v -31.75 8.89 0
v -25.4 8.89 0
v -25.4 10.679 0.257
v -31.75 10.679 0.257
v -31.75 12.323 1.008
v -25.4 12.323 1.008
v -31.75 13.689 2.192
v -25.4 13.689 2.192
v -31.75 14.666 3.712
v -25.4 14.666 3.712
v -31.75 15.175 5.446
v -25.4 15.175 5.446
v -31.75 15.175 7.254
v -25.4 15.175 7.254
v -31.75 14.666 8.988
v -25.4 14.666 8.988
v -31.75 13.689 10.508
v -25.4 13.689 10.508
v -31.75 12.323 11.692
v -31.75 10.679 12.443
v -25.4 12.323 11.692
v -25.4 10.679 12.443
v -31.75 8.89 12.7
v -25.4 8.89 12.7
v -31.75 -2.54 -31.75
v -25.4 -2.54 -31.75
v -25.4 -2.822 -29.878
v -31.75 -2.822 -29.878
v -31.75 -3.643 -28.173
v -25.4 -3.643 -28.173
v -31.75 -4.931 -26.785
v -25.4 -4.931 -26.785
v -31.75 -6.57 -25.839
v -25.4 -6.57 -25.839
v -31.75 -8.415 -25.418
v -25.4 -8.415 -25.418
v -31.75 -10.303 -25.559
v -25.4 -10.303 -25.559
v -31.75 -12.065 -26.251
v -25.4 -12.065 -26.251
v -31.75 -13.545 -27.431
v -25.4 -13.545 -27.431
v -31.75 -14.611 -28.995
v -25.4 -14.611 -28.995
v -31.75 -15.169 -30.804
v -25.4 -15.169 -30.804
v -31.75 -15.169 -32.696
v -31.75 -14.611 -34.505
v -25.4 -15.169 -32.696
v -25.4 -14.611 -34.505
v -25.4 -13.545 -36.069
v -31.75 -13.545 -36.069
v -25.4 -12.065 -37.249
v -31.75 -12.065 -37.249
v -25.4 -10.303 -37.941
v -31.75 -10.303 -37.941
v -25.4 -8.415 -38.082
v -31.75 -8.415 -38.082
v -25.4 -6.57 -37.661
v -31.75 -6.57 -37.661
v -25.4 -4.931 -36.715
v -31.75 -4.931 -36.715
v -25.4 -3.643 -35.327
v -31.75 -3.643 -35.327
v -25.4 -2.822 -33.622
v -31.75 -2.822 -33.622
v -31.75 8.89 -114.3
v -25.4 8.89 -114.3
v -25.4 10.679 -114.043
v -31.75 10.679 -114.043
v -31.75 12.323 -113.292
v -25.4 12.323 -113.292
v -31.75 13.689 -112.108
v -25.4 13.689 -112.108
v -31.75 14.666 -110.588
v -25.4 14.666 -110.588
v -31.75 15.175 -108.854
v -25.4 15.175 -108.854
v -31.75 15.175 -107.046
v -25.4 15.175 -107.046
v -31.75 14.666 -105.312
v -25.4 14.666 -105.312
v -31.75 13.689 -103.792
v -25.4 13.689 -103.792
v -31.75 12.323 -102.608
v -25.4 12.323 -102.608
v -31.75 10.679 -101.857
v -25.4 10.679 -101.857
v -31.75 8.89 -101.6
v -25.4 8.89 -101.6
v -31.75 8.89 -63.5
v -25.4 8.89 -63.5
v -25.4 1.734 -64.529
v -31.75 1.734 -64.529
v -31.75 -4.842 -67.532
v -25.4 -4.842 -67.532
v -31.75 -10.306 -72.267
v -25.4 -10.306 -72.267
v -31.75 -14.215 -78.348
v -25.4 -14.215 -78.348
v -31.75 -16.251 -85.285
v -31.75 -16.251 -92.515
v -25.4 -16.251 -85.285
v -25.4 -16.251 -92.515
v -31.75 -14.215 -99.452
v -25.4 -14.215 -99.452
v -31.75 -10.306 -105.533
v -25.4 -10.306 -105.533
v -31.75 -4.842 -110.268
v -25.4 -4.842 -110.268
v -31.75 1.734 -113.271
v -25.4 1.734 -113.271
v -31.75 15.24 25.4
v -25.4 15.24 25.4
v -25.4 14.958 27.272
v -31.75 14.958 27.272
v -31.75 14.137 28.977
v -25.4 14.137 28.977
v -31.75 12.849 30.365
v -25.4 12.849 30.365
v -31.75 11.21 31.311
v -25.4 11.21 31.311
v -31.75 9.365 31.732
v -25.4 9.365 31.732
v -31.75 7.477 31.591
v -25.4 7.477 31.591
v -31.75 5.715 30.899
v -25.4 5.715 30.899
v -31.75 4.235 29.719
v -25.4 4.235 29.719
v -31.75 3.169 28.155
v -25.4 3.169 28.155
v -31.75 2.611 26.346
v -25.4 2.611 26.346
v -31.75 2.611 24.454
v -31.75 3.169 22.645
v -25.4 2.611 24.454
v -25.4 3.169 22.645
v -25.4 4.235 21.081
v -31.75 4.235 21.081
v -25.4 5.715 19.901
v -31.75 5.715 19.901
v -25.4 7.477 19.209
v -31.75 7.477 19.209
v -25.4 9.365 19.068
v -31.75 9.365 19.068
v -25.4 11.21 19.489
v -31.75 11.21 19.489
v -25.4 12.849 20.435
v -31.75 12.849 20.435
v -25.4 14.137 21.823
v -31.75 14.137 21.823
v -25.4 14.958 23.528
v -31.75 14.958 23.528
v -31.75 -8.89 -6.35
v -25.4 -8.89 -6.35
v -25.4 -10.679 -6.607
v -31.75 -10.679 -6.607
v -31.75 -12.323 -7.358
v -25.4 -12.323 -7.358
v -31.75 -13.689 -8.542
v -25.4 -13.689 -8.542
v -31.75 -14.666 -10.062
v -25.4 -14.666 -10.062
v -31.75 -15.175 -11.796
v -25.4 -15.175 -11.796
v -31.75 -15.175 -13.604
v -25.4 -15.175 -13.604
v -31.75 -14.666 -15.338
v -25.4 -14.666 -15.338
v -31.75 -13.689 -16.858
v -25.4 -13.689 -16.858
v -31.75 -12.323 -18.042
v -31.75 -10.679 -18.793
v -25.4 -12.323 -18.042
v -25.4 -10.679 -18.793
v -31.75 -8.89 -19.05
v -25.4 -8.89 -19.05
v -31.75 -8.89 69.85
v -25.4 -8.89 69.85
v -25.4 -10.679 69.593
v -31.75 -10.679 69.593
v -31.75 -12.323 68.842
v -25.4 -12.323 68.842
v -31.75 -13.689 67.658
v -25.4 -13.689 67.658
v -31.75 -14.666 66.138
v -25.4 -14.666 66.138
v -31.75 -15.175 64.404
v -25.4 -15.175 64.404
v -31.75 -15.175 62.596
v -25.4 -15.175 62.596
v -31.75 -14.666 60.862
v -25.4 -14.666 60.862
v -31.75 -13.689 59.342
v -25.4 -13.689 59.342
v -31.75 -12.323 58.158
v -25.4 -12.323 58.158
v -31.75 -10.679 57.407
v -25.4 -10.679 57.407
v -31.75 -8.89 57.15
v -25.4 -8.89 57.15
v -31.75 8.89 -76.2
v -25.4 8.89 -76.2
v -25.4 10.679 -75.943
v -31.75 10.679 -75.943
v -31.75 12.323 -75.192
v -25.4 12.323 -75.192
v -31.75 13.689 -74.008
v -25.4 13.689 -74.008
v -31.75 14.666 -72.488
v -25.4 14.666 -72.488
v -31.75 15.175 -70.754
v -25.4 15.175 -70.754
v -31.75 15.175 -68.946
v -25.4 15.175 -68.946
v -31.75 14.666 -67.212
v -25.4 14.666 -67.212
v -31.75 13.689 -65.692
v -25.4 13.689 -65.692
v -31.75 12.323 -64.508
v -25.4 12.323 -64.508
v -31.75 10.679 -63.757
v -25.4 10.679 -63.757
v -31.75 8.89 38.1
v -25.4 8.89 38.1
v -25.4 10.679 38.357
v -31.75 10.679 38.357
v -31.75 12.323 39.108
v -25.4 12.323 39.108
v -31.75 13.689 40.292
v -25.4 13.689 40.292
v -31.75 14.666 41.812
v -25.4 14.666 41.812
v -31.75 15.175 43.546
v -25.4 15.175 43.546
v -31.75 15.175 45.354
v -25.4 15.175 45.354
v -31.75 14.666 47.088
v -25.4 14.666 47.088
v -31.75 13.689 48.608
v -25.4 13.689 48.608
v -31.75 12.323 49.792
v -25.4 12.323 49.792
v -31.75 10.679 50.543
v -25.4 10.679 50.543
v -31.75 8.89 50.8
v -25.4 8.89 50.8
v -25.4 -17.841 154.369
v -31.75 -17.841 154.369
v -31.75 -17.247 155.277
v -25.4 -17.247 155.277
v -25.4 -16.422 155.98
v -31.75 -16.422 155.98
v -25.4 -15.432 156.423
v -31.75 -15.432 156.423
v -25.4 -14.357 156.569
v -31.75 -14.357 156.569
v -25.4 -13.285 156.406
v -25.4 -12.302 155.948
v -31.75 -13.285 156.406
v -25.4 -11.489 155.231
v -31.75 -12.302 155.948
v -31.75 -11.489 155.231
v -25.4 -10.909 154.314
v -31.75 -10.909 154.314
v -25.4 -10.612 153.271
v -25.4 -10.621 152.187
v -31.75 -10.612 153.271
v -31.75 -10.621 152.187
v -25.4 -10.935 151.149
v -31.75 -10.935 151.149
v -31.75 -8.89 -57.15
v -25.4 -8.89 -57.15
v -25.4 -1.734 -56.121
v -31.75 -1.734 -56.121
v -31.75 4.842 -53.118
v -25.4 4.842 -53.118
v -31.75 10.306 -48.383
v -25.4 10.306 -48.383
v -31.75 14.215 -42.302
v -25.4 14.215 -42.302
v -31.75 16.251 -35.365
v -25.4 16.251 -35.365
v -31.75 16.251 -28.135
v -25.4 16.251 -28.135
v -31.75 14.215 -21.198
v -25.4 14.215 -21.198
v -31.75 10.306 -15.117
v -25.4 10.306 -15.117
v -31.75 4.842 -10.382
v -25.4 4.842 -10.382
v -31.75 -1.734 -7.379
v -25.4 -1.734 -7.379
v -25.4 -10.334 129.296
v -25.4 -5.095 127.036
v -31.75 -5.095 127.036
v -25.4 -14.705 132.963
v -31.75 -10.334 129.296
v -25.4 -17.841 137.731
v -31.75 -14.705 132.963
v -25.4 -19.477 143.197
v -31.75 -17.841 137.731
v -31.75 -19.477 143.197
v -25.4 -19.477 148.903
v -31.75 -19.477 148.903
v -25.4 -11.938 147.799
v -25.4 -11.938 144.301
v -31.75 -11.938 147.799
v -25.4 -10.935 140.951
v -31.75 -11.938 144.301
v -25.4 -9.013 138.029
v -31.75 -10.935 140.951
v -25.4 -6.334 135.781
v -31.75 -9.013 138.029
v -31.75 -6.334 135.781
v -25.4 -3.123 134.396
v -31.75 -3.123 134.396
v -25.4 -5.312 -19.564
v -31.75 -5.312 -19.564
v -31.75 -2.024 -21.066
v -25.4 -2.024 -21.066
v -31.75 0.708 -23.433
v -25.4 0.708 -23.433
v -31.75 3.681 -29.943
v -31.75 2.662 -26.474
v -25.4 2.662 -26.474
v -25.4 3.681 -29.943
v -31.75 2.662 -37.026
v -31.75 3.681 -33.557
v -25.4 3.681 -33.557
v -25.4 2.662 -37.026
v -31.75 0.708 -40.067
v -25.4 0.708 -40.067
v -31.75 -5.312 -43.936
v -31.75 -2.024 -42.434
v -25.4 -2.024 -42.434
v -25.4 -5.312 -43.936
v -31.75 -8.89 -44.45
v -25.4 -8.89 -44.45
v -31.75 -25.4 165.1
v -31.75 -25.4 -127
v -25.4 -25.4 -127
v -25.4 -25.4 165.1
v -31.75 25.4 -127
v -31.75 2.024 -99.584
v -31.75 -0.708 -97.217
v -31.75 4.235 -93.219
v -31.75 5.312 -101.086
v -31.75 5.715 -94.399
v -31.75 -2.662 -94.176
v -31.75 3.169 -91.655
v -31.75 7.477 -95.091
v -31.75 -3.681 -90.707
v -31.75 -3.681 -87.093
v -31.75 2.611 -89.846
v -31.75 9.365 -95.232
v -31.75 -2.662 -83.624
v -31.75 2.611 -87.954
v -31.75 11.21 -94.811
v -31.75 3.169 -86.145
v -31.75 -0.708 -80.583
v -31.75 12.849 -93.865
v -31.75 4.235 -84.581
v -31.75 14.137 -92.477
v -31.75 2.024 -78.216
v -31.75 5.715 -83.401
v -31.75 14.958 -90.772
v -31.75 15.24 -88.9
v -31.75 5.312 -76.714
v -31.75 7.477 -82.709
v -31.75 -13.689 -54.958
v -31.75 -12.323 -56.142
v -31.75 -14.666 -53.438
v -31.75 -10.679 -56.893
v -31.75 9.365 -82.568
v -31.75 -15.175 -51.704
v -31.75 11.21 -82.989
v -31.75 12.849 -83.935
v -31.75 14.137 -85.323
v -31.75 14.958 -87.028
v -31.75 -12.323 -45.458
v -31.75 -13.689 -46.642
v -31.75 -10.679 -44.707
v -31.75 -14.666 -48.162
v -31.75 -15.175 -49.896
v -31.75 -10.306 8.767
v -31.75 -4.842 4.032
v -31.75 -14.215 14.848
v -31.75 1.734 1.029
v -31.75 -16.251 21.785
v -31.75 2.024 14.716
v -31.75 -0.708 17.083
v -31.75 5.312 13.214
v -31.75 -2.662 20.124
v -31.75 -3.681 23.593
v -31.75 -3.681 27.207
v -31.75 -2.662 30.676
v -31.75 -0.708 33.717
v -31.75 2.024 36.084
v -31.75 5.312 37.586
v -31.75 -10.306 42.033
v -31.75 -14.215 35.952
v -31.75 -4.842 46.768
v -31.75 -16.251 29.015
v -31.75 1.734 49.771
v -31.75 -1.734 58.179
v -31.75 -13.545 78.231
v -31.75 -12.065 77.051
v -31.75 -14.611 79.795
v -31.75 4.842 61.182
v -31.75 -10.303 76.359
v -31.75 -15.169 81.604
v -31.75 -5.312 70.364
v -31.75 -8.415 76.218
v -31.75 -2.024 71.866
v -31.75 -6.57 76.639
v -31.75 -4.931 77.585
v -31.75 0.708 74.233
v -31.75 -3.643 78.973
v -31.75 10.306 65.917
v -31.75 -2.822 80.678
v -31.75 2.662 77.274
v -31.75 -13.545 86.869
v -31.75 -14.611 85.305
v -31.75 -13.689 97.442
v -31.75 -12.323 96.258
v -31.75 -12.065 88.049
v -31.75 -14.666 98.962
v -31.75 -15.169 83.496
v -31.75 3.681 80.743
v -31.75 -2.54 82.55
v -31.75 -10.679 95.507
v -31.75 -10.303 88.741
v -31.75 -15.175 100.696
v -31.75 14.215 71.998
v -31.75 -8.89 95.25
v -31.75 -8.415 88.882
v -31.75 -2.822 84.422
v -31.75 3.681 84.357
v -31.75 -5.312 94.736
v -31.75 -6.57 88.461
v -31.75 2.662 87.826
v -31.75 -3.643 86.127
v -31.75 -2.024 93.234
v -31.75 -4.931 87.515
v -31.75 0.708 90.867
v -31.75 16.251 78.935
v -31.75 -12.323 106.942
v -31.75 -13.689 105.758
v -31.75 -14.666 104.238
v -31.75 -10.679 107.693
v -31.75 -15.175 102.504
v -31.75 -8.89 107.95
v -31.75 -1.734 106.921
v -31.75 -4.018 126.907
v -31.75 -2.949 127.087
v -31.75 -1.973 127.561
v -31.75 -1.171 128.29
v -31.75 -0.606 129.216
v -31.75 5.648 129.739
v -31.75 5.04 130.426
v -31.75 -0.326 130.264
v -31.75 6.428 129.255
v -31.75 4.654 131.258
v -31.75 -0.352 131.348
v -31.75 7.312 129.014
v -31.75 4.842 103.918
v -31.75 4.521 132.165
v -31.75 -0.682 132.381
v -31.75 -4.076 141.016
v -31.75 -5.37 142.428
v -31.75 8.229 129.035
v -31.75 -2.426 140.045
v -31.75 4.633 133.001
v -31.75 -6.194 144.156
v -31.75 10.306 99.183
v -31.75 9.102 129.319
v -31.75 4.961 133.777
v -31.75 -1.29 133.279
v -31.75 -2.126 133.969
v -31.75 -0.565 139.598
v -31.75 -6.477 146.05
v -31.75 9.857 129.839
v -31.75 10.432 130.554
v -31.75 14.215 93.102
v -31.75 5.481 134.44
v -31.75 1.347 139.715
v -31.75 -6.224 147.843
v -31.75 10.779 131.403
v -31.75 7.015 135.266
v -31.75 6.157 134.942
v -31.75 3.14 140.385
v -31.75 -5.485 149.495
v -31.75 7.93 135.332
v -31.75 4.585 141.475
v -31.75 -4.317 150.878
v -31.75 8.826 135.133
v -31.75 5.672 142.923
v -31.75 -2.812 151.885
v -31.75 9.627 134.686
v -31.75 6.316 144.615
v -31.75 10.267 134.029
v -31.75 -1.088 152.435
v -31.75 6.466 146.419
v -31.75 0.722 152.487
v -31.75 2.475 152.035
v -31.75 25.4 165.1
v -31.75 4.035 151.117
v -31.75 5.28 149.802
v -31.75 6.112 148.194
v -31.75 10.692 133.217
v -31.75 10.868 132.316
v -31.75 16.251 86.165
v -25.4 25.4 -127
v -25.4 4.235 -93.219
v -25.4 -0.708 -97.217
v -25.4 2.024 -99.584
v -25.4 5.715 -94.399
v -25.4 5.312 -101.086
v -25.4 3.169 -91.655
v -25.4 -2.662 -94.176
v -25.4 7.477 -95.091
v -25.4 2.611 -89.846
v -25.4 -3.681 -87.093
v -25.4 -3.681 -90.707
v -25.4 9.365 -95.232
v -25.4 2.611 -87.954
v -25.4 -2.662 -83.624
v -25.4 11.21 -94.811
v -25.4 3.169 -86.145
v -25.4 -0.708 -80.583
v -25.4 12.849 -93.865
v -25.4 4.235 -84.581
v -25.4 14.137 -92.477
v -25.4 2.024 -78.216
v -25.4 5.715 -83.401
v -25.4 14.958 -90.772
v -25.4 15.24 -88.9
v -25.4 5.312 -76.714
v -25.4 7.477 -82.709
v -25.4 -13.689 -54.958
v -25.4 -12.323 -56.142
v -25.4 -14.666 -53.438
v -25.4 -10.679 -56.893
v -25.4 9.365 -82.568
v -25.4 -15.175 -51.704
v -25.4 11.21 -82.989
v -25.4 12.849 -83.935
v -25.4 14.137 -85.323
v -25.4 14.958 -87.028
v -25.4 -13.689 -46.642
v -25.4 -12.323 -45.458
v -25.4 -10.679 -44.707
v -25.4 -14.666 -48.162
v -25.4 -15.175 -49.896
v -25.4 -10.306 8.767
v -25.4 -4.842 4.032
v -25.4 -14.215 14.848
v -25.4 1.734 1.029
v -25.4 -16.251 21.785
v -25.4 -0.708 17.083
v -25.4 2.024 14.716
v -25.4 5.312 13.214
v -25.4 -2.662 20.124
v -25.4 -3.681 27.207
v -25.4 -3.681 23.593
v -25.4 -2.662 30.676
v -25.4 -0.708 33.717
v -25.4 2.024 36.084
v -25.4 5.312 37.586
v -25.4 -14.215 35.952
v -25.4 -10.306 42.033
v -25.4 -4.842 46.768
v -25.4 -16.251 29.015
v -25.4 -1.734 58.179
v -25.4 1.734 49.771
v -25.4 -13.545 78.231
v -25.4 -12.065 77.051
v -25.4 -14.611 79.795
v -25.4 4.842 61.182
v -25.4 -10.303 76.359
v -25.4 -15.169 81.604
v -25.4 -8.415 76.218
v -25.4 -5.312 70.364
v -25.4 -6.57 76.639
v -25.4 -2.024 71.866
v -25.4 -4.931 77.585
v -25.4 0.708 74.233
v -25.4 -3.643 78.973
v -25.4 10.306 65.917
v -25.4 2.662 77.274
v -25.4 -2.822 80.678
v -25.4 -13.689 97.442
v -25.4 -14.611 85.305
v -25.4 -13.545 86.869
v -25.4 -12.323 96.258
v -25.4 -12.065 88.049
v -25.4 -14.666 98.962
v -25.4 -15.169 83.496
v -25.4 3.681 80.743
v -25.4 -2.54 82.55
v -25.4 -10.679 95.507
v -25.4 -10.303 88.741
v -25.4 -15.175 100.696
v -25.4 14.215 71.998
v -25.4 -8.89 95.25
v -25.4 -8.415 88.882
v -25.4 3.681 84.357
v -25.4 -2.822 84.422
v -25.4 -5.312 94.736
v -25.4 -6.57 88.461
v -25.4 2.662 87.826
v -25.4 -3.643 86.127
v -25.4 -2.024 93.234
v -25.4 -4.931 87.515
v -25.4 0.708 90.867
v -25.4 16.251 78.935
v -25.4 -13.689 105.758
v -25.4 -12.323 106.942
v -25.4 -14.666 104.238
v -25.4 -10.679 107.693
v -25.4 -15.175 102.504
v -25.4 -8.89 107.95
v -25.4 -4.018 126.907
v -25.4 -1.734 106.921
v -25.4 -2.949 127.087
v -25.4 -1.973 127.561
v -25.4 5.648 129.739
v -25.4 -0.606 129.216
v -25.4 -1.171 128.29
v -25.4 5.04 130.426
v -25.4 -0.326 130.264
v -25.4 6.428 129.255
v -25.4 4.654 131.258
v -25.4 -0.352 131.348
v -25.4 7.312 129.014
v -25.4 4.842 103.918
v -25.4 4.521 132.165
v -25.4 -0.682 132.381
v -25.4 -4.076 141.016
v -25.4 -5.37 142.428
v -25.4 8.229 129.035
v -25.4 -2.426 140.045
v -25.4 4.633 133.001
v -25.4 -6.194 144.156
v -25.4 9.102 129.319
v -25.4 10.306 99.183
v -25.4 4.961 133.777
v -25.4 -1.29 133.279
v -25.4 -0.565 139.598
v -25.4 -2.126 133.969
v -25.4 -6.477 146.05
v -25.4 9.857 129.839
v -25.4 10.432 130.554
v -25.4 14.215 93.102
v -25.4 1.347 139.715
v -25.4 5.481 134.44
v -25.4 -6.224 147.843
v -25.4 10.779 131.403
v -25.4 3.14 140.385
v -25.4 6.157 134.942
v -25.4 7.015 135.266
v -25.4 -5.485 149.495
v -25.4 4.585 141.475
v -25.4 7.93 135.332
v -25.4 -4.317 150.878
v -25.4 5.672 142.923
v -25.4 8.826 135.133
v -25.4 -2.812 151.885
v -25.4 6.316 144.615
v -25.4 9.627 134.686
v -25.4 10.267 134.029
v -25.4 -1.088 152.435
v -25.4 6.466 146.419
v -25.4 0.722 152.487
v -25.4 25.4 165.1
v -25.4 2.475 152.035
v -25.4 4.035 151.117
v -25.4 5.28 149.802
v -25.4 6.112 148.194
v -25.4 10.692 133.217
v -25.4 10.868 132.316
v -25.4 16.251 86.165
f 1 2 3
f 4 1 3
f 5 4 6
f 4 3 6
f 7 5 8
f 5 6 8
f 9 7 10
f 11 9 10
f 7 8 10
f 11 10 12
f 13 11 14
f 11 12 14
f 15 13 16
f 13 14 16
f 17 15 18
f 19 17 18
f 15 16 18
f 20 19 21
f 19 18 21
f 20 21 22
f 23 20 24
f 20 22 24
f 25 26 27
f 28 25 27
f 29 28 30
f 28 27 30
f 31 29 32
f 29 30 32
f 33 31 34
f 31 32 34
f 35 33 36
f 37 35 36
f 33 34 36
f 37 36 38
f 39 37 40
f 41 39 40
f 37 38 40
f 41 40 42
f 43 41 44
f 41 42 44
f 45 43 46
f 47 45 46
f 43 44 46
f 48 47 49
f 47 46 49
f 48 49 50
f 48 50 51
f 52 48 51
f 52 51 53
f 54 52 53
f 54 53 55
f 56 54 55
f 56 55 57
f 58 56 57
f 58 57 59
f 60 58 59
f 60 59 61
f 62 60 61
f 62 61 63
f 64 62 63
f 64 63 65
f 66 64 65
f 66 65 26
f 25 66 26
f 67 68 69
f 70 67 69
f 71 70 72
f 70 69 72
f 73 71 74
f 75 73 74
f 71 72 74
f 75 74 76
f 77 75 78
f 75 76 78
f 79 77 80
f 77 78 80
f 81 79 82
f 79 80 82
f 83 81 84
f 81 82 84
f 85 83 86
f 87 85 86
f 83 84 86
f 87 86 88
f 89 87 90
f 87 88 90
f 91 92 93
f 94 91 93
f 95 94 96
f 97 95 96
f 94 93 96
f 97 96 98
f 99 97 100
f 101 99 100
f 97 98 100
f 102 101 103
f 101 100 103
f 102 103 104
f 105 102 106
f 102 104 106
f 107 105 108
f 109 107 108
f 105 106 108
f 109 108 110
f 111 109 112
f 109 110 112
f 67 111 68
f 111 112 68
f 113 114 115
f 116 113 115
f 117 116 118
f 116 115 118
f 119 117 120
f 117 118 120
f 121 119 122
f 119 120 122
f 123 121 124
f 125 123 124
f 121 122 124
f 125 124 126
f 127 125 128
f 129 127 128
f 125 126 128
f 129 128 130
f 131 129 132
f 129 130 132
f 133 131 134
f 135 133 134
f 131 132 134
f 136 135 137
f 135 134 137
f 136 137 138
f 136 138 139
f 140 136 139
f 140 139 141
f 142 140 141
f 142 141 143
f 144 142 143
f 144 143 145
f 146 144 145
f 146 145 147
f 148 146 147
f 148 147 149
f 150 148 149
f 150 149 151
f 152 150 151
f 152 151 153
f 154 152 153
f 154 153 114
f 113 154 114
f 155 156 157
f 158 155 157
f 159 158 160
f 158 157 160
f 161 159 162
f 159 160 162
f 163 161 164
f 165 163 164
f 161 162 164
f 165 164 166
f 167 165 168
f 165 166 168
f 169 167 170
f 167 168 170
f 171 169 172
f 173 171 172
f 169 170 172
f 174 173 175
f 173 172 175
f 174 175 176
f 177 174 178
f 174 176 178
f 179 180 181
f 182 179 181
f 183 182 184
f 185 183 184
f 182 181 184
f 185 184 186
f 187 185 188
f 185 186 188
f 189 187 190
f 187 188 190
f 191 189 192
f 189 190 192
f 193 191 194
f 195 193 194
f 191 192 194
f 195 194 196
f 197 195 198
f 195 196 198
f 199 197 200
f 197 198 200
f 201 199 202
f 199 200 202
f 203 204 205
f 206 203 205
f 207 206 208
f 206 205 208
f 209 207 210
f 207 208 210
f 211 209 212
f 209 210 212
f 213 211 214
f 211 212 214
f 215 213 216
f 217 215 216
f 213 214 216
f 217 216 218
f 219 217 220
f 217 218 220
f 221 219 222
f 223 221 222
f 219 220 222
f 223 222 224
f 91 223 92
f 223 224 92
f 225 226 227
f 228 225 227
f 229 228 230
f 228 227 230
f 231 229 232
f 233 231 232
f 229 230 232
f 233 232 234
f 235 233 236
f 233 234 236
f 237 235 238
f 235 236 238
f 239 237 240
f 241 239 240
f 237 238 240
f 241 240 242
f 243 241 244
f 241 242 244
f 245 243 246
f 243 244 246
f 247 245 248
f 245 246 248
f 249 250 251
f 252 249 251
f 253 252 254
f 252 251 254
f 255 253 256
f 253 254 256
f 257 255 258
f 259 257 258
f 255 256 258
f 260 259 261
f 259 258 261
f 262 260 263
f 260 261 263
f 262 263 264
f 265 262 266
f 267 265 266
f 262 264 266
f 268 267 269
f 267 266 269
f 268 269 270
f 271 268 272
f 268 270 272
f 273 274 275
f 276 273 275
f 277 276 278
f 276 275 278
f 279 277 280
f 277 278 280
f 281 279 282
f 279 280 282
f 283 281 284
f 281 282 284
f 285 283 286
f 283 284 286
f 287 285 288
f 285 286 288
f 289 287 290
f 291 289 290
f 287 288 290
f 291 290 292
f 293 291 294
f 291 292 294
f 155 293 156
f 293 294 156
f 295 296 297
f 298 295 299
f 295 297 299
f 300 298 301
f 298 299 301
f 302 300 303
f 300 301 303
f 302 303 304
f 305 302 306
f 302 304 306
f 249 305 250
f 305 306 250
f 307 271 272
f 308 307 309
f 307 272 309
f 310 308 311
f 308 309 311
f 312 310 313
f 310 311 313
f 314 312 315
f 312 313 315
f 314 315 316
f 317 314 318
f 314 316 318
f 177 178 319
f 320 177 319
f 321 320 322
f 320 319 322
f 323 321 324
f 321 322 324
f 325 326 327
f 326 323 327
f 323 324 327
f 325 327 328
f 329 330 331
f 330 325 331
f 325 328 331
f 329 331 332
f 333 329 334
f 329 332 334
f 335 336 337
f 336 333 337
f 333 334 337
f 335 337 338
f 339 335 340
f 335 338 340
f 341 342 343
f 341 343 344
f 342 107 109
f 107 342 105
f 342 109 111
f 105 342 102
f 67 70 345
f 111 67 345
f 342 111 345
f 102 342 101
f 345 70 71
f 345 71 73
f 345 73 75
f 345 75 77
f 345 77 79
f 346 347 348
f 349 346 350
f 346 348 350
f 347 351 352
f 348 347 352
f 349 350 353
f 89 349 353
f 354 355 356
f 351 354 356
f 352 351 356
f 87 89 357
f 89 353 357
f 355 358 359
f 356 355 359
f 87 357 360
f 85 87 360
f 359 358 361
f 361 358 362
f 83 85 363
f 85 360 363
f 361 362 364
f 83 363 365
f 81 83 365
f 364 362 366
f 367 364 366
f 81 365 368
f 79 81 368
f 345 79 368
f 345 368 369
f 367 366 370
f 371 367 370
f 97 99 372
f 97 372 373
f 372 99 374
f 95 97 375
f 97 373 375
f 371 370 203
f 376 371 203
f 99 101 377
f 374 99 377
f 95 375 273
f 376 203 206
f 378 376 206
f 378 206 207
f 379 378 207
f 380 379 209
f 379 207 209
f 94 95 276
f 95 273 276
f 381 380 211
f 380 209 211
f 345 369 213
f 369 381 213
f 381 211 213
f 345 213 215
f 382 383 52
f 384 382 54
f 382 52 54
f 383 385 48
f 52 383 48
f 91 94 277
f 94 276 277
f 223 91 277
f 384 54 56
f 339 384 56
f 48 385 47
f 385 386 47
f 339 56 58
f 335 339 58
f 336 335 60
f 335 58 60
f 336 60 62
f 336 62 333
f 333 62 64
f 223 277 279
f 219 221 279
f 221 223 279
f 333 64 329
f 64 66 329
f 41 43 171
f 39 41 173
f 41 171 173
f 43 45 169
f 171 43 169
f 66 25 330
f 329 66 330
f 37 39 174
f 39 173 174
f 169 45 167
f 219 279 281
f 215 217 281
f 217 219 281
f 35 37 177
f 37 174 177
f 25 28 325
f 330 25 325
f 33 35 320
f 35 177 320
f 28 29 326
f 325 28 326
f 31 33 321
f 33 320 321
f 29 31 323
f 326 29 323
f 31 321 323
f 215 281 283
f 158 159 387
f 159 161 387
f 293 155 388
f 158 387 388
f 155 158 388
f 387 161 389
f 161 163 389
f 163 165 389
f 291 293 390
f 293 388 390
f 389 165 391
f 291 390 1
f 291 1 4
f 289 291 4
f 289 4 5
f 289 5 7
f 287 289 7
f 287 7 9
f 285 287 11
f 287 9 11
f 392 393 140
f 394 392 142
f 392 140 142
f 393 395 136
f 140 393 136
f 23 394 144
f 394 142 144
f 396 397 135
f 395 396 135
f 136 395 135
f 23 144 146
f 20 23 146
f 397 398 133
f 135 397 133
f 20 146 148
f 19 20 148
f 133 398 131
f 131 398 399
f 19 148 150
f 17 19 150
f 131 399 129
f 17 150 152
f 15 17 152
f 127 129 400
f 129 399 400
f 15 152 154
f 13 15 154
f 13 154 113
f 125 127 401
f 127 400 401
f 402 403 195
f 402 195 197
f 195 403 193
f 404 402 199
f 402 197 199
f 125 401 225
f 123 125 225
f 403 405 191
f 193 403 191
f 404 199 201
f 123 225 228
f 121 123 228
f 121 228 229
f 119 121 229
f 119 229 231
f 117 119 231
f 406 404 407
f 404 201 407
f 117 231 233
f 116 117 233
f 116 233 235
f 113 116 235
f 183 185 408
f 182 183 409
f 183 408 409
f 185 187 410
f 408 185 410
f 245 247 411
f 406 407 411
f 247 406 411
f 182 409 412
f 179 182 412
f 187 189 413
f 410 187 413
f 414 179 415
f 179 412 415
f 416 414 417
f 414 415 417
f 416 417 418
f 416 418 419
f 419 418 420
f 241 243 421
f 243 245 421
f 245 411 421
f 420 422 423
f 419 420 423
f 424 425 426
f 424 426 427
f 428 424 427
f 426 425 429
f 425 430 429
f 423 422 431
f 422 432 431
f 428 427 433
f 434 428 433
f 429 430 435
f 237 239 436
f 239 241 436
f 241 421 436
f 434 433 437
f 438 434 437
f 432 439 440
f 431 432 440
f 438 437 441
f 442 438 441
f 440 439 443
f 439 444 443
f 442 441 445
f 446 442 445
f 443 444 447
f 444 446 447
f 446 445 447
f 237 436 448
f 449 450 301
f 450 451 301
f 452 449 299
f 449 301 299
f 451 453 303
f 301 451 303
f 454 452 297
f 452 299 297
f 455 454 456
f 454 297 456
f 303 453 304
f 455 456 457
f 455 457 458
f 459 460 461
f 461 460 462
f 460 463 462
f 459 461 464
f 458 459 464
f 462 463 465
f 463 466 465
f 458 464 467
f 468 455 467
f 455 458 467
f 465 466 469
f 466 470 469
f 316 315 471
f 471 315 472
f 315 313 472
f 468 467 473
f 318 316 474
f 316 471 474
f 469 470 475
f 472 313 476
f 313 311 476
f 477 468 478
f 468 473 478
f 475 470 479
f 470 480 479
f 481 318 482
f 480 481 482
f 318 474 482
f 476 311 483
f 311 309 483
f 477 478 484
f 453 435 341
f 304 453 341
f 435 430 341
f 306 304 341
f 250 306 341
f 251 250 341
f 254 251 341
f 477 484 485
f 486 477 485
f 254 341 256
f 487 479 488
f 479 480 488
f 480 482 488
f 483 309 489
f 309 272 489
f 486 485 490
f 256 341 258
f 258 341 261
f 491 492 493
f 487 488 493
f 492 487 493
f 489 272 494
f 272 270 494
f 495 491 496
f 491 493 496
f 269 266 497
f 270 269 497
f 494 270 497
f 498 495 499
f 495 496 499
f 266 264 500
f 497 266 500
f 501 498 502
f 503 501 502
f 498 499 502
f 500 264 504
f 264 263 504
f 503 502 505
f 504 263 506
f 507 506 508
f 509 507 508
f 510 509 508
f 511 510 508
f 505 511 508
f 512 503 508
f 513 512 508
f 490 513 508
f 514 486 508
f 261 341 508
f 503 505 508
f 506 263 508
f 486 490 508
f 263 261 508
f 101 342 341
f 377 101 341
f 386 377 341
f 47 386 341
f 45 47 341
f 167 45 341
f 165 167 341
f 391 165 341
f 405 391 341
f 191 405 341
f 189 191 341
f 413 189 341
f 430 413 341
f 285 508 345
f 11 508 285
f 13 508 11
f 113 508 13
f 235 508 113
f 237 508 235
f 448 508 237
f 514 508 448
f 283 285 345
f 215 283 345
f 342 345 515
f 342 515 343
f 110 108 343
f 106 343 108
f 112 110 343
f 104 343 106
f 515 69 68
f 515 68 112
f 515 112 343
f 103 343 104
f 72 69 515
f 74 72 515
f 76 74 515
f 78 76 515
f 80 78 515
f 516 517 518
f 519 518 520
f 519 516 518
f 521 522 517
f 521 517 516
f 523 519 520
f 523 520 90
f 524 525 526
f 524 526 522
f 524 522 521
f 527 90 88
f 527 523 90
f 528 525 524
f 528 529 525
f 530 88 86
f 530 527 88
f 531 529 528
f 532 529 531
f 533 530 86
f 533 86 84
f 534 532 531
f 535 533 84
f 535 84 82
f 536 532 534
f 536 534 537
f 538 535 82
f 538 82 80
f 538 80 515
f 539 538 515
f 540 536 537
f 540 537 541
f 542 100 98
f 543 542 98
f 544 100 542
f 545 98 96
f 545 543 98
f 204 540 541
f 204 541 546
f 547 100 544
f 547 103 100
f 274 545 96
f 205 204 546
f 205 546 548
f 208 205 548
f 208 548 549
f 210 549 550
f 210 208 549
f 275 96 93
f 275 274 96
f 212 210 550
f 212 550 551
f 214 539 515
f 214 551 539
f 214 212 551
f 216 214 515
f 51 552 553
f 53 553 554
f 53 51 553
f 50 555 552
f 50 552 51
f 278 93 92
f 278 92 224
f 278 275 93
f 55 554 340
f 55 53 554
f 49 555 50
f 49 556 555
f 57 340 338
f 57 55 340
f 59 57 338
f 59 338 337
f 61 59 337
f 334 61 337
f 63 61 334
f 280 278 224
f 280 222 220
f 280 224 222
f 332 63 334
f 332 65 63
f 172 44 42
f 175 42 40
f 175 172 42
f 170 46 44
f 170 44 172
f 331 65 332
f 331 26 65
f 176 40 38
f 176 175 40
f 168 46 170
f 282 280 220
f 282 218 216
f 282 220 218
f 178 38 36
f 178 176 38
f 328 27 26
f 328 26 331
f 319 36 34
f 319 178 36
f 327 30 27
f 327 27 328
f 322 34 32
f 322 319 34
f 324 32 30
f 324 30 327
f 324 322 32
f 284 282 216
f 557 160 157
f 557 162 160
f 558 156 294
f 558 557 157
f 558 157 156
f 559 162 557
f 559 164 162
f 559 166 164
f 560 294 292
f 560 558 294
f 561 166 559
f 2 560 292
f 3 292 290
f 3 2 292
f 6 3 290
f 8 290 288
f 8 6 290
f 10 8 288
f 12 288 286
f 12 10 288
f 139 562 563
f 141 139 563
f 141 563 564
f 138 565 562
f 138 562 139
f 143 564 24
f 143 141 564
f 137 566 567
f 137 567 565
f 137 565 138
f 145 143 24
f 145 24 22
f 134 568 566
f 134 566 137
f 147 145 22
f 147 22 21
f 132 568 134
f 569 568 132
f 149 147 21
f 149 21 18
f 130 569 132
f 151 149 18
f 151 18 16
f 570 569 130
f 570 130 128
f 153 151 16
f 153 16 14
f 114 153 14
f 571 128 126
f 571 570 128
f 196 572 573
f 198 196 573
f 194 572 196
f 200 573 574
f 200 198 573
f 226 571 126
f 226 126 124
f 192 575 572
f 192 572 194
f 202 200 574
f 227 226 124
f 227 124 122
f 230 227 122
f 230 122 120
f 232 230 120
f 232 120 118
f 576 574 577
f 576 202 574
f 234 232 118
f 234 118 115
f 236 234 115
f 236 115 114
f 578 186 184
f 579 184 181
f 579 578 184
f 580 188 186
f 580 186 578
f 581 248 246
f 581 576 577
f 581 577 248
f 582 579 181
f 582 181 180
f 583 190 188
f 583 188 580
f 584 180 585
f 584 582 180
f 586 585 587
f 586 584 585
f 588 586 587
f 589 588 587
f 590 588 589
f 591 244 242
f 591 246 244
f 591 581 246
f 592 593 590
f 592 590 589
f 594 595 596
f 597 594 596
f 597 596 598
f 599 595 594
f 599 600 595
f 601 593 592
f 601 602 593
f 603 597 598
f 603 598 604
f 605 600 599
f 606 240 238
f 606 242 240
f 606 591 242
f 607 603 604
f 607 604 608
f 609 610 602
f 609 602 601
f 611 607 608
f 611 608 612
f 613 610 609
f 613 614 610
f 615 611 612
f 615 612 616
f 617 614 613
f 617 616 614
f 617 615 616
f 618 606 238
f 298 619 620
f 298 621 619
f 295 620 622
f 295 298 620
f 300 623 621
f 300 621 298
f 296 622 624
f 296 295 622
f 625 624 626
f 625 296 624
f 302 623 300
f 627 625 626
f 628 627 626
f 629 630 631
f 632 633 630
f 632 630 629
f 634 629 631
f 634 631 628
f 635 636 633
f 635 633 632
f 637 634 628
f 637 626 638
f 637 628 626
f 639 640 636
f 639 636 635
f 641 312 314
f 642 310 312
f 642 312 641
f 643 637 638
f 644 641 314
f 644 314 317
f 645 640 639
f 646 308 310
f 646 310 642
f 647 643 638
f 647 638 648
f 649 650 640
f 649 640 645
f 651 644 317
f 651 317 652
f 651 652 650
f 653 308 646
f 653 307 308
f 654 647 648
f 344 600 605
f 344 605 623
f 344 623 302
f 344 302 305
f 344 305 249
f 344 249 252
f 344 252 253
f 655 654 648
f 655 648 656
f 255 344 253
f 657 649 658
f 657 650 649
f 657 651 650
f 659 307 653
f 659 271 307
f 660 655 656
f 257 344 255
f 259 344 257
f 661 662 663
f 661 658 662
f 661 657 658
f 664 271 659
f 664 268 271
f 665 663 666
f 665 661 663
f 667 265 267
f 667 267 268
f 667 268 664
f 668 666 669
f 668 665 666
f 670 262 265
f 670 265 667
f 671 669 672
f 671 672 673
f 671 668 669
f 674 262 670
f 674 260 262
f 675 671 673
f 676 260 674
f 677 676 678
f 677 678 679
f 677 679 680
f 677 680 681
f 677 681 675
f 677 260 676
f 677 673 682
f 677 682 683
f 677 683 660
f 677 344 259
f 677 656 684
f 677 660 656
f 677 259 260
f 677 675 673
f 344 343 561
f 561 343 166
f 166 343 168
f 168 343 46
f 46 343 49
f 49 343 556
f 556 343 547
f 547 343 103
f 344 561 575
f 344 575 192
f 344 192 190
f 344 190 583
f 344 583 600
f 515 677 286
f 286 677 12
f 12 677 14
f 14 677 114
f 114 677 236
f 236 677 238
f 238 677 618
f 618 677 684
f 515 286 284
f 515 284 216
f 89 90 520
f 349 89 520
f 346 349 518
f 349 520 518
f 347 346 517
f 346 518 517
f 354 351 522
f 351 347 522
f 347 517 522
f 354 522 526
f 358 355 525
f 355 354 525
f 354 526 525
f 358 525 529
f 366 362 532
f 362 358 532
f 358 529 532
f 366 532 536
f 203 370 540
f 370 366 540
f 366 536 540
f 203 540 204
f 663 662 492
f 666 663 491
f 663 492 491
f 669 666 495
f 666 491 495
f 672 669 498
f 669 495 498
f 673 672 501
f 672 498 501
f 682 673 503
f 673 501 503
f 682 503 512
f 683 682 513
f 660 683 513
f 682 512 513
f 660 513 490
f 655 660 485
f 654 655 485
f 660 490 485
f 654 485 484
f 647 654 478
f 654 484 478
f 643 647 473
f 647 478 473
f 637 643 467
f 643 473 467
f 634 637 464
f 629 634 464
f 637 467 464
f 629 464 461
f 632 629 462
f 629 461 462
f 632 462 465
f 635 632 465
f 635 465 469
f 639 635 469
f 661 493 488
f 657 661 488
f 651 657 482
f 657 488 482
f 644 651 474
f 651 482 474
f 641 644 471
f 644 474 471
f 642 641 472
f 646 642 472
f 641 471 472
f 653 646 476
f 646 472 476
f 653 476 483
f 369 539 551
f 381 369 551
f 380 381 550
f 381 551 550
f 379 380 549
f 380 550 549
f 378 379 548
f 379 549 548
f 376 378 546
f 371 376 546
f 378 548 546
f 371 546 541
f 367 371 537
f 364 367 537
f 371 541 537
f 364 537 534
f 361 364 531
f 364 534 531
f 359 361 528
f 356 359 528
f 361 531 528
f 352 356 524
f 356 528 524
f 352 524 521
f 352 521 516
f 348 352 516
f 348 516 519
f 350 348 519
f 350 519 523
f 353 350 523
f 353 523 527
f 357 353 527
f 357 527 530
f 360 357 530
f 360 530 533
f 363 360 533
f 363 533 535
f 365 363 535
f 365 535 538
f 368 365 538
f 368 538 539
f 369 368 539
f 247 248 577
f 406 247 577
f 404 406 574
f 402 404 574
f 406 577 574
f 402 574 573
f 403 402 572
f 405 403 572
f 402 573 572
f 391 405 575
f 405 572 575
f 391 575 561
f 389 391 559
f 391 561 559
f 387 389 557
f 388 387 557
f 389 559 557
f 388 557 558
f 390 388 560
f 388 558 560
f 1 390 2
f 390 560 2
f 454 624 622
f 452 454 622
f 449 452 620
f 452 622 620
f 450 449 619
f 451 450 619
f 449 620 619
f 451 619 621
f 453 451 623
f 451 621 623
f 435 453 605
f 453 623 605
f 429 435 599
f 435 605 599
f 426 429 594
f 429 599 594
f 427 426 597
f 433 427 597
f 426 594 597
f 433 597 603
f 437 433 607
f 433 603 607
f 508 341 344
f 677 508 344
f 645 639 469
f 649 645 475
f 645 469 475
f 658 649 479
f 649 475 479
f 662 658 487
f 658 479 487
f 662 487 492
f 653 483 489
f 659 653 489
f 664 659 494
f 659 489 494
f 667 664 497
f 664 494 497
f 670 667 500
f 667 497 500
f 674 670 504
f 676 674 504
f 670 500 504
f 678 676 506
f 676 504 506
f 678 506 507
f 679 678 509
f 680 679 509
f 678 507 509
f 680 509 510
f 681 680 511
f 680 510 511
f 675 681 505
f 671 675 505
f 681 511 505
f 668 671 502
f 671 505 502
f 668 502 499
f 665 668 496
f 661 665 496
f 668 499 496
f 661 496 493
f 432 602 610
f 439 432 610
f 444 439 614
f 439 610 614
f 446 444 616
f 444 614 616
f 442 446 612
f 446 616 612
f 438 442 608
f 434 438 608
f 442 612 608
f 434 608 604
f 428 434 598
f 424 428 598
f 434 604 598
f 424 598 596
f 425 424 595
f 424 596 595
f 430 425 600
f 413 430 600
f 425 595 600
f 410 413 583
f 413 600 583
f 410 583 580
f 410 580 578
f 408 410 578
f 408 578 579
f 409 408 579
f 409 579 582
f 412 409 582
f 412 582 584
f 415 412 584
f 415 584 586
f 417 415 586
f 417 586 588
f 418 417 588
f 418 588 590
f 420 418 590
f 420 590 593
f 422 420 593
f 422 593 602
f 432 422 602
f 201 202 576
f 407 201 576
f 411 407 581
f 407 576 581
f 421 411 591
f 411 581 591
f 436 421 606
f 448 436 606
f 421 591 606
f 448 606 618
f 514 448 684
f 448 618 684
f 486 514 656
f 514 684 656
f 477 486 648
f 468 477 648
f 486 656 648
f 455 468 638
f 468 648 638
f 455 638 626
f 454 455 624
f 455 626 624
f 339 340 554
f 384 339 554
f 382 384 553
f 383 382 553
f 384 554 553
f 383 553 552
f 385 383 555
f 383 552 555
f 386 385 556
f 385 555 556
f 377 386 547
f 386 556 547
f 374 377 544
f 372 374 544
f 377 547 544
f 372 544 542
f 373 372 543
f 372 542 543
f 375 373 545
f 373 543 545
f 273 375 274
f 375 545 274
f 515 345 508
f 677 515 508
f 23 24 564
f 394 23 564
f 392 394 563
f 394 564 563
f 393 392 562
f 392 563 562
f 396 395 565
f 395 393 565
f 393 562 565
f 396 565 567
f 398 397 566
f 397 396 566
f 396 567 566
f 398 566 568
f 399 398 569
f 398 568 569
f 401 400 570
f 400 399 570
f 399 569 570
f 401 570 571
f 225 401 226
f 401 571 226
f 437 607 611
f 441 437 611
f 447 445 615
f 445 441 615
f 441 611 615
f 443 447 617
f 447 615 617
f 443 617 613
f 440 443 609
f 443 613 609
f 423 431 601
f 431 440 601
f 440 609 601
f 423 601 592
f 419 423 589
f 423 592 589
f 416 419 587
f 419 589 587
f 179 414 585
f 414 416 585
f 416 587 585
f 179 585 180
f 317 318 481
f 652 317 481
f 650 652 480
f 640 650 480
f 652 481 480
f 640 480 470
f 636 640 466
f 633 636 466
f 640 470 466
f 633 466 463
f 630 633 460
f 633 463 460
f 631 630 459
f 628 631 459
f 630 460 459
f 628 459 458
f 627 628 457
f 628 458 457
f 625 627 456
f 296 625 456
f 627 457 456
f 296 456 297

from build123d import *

# Parameters (mm, degrees)
F0_W      = 63.5
F0_H      = 63.5
F0_W_2    = 50.8
F0_H_2    = 50.8
F1_DEPTH  = 165.1
F3_R      = 6.477
F4_DEPTH  = 25.4
F6_DEPTH  = 25.4
F7_R      = 6.35
F8_DEPTH  = 63.501
F9_W      = 145.7979530096
F9_H      = 377.9422044754
F9_W_2    = 50.8
F9_H_2    = 292.1
F10_DEPTH = 63.5
F11_W     = 97.6704657078
F11_H     = 338.8985395432
F12_DEPTH = 57.151


# Not quite as in the source:
# - ends of sketch curves that miss each other by under 0.0002 mm in the source are joined


with BuildPart() as f1:
    # F0 (on Top) → F1 (new body, symmetric)
    with BuildSketch(Plane.XY):
        Rectangle(F0_W, F0_H)
        Rectangle(F0_W_2, F0_H_2, mode=Mode.SUBTRACT)
    extrude(amount=F1_DEPTH, both=True)

    # F3 (on face) → F4 (cut)
    with BuildSketch(Plane.YZ.offset(31.75)):
        with Locations((0, 146.05)):
            Circle(F3_R)
        with BuildLine():
            ThreePointArc((10.1385245046, 129.1766616857), (14.6288058895, 132.8781640138), (17.8406687878, 137.7307595176))
            ThreePointArc((17.8406687878, 137.7307595176), (19.4934269332, 143.3103775076), (19.4426449846, 149.1294124443))
            ThreePointArc((19.4426449846, 149.1294124443), (15.0835370951, 152.2964897102), (11.9164598293, 147.9373818207))
            ThreePointArc((11.9164598293, 147.9373818207), (11.9475842494, 144.3708765369), (10.9346034506, 140.9511106721))
            ThreePointArc((10.9346034506, 140.9511106721), (8.9660423194, 137.9769392343), (6.2139343738, 135.708276517))
            ThreePointArc((6.2139343738, 135.708276517), (4.9104220235, 130.4801740359), (10.1385245046, 129.1766616857))
        make_face()
        with BuildLine():
            ThreePointArc((-10.1385245046, 129.1766616857), (-4.9104220235, 130.4801740359), (-6.2139343738, 135.708276517))
            ThreePointArc((-6.2139343738, 135.708276517), (-8.9660423194, 137.9769392343), (-10.9346034506, 140.9511106721))
            ThreePointArc((-10.9346034506, 140.9511106721), (-11.9475842494, 144.3708765369), (-11.9164598293, 147.9373818207))
            ThreePointArc((-11.9164598293, 147.9373818207), (-15.0835370951, 152.2964897102), (-19.4426449846, 149.1294124443))
            ThreePointArc((-19.4426449846, 149.1294124443), (-19.4934269332, 143.3103775076), (-17.8406687878, 137.7307595176))
            ThreePointArc((-17.8406687878, 137.7307595176), (-14.6288058895, 132.8781640138), (-10.1385245046, 129.1766616857))
        make_face()
    extrude(amount=-F4_DEPTH, mode=Mode.SUBTRACT)

    # F5 (on face) → F6 (cut)
    with BuildSketch(Plane(origin=(-31.75, 0, 0), x_dir=(0, -1, 0), z_dir=(-1, 0, 0))):
        with BuildLine():
            ThreePointArc((-3.1401119103, 140.3850881569), (3.2873259769, 140.4692279278), (6.477, 146.05))
            ThreePointArc((6.477, 146.05), (-3.2873259769, 151.6307720722), (-3.1401119103, 140.3850881569))
        make_face()
        with BuildLine():
            ThreePointArc((-4.5213527214, 132.1654121492), (-4.960680137, 133.7768464516), (-6.1570821771, 134.9423297193))
            ThreePointArc((-6.1570821771, 134.9423297193), (-10.4320253058, 130.5539778468), (-4.5213527214, 132.1654121492))
        make_face()
        with BuildLine():
            ThreePointArc((3.1226517792, 134.3961049058), (0.4285749428, 129.7298269458), (5.0948529028, 127.0357501095))
            ThreePointArc((5.0948529028, 127.0357501095), (17.8406687878, 137.7307595176), (17.8406687878, 154.3692404824))
            ThreePointArc((17.8406687878, 154.3692404824), (12.777460542, 156.2120975737), (10.9346034506, 151.1488893279))
            ThreePointArc((10.9346034506, 151.1488893279), (10.9346034506, 140.9511106721), (3.1226517792, 134.3961049058))
        make_face()
    extrude(amount=-F6_DEPTH, mode=Mode.SUBTRACT)

    # F7 (on face) → F8 (cut, through all)
    with BuildSketch(Plane.YZ.offset(31.75)):
        with BuildLine():
            ThreePointArc((-8.89, 107.949999693), (-15.239999693, 101.6), (-8.89, 95.250000307))
            ThreePointArc((-8.89, 95.250000307), (3.81, 82.55), (-8.89, 69.85))
            ThreePointArc((-8.89, 69.85), (-15.239999693, 63.5), (-8.89, 57.150000307))
            ThreePointArc((-8.89, 57.150000307), (16.509999693, 82.55), (-8.89, 107.949999693))
        make_face()
        with BuildLine():
            ThreePointArc((8.89, 3.07e-07), (15.239999693, 6.35), (8.89, 12.699999693))
            ThreePointArc((8.89, 12.699999693), (-3.81, 25.4), (8.89, 38.1))
            ThreePointArc((8.89, 38.1), (15.24, 44.45), (8.89, 50.8))
            ThreePointArc((8.89, 50.8), (-16.509999693, 25.4), (8.89, 3.07e-07))
        make_face()
        with BuildLine():
            ThreePointArc((-8.89, -6.350000307), (-15.239999693, -12.7), (-8.89, -19.049999693))
            ThreePointArc((-8.89, -19.049999693), (3.81, -31.75), (-8.89, -44.45))
            ThreePointArc((-8.89, -44.45), (-15.239999693, -50.8), (-8.89, -57.149999693))
            ThreePointArc((-8.89, -57.149999693), (16.509999693, -31.75), (-8.89, -6.350000307))
        make_face()
        with BuildLine():
            ThreePointArc((8.89, -114.299999693), (15.239999693, -107.95), (8.89, -101.600000307))
            ThreePointArc((8.89, -101.600000307), (-3.81, -88.9), (8.89, -76.2))
            ThreePointArc((8.89, -76.2), (15.24, -69.85), (8.89, -63.5))
            ThreePointArc((8.89, -63.5), (-16.509999693, -88.9), (8.89, -114.299999693))
        make_face()
        with Locations((-8.89, 82.55)):
            Circle(F7_R)
        with Locations((8.89, 25.4)):
            Circle(F7_R)
        with Locations((8.89, -88.9)):
            Circle(F7_R)
        with Locations((-8.89, -31.75)):
            Circle(F7_R)
    extrude(amount=-F8_DEPTH, mode=Mode.SUBTRACT)

    # F9 (on face) → F10 (cut, symmetric)
    with BuildSketch(Plane(origin=(25.4, 0, 0), x_dir=(0, -1, 0), z_dir=(-1, 0, 0))):
        Rectangle(F9_W, F9_H)
        with Locations((0, 19.05)):
            Rectangle(F9_W_2, F9_H_2, mode=Mode.SUBTRACT)
    extrude(amount=F10_DEPTH, both=True, mode=Mode.SUBTRACT)

    # F11 (on face) → F12 (cut, through all)
    with BuildSketch(Plane.YZ.offset(-25.4)):
        Rectangle(F11_W, F11_H)
    extrude(amount=F12_DEPTH, mode=Mode.SUBTRACT)


solid = f1.part
